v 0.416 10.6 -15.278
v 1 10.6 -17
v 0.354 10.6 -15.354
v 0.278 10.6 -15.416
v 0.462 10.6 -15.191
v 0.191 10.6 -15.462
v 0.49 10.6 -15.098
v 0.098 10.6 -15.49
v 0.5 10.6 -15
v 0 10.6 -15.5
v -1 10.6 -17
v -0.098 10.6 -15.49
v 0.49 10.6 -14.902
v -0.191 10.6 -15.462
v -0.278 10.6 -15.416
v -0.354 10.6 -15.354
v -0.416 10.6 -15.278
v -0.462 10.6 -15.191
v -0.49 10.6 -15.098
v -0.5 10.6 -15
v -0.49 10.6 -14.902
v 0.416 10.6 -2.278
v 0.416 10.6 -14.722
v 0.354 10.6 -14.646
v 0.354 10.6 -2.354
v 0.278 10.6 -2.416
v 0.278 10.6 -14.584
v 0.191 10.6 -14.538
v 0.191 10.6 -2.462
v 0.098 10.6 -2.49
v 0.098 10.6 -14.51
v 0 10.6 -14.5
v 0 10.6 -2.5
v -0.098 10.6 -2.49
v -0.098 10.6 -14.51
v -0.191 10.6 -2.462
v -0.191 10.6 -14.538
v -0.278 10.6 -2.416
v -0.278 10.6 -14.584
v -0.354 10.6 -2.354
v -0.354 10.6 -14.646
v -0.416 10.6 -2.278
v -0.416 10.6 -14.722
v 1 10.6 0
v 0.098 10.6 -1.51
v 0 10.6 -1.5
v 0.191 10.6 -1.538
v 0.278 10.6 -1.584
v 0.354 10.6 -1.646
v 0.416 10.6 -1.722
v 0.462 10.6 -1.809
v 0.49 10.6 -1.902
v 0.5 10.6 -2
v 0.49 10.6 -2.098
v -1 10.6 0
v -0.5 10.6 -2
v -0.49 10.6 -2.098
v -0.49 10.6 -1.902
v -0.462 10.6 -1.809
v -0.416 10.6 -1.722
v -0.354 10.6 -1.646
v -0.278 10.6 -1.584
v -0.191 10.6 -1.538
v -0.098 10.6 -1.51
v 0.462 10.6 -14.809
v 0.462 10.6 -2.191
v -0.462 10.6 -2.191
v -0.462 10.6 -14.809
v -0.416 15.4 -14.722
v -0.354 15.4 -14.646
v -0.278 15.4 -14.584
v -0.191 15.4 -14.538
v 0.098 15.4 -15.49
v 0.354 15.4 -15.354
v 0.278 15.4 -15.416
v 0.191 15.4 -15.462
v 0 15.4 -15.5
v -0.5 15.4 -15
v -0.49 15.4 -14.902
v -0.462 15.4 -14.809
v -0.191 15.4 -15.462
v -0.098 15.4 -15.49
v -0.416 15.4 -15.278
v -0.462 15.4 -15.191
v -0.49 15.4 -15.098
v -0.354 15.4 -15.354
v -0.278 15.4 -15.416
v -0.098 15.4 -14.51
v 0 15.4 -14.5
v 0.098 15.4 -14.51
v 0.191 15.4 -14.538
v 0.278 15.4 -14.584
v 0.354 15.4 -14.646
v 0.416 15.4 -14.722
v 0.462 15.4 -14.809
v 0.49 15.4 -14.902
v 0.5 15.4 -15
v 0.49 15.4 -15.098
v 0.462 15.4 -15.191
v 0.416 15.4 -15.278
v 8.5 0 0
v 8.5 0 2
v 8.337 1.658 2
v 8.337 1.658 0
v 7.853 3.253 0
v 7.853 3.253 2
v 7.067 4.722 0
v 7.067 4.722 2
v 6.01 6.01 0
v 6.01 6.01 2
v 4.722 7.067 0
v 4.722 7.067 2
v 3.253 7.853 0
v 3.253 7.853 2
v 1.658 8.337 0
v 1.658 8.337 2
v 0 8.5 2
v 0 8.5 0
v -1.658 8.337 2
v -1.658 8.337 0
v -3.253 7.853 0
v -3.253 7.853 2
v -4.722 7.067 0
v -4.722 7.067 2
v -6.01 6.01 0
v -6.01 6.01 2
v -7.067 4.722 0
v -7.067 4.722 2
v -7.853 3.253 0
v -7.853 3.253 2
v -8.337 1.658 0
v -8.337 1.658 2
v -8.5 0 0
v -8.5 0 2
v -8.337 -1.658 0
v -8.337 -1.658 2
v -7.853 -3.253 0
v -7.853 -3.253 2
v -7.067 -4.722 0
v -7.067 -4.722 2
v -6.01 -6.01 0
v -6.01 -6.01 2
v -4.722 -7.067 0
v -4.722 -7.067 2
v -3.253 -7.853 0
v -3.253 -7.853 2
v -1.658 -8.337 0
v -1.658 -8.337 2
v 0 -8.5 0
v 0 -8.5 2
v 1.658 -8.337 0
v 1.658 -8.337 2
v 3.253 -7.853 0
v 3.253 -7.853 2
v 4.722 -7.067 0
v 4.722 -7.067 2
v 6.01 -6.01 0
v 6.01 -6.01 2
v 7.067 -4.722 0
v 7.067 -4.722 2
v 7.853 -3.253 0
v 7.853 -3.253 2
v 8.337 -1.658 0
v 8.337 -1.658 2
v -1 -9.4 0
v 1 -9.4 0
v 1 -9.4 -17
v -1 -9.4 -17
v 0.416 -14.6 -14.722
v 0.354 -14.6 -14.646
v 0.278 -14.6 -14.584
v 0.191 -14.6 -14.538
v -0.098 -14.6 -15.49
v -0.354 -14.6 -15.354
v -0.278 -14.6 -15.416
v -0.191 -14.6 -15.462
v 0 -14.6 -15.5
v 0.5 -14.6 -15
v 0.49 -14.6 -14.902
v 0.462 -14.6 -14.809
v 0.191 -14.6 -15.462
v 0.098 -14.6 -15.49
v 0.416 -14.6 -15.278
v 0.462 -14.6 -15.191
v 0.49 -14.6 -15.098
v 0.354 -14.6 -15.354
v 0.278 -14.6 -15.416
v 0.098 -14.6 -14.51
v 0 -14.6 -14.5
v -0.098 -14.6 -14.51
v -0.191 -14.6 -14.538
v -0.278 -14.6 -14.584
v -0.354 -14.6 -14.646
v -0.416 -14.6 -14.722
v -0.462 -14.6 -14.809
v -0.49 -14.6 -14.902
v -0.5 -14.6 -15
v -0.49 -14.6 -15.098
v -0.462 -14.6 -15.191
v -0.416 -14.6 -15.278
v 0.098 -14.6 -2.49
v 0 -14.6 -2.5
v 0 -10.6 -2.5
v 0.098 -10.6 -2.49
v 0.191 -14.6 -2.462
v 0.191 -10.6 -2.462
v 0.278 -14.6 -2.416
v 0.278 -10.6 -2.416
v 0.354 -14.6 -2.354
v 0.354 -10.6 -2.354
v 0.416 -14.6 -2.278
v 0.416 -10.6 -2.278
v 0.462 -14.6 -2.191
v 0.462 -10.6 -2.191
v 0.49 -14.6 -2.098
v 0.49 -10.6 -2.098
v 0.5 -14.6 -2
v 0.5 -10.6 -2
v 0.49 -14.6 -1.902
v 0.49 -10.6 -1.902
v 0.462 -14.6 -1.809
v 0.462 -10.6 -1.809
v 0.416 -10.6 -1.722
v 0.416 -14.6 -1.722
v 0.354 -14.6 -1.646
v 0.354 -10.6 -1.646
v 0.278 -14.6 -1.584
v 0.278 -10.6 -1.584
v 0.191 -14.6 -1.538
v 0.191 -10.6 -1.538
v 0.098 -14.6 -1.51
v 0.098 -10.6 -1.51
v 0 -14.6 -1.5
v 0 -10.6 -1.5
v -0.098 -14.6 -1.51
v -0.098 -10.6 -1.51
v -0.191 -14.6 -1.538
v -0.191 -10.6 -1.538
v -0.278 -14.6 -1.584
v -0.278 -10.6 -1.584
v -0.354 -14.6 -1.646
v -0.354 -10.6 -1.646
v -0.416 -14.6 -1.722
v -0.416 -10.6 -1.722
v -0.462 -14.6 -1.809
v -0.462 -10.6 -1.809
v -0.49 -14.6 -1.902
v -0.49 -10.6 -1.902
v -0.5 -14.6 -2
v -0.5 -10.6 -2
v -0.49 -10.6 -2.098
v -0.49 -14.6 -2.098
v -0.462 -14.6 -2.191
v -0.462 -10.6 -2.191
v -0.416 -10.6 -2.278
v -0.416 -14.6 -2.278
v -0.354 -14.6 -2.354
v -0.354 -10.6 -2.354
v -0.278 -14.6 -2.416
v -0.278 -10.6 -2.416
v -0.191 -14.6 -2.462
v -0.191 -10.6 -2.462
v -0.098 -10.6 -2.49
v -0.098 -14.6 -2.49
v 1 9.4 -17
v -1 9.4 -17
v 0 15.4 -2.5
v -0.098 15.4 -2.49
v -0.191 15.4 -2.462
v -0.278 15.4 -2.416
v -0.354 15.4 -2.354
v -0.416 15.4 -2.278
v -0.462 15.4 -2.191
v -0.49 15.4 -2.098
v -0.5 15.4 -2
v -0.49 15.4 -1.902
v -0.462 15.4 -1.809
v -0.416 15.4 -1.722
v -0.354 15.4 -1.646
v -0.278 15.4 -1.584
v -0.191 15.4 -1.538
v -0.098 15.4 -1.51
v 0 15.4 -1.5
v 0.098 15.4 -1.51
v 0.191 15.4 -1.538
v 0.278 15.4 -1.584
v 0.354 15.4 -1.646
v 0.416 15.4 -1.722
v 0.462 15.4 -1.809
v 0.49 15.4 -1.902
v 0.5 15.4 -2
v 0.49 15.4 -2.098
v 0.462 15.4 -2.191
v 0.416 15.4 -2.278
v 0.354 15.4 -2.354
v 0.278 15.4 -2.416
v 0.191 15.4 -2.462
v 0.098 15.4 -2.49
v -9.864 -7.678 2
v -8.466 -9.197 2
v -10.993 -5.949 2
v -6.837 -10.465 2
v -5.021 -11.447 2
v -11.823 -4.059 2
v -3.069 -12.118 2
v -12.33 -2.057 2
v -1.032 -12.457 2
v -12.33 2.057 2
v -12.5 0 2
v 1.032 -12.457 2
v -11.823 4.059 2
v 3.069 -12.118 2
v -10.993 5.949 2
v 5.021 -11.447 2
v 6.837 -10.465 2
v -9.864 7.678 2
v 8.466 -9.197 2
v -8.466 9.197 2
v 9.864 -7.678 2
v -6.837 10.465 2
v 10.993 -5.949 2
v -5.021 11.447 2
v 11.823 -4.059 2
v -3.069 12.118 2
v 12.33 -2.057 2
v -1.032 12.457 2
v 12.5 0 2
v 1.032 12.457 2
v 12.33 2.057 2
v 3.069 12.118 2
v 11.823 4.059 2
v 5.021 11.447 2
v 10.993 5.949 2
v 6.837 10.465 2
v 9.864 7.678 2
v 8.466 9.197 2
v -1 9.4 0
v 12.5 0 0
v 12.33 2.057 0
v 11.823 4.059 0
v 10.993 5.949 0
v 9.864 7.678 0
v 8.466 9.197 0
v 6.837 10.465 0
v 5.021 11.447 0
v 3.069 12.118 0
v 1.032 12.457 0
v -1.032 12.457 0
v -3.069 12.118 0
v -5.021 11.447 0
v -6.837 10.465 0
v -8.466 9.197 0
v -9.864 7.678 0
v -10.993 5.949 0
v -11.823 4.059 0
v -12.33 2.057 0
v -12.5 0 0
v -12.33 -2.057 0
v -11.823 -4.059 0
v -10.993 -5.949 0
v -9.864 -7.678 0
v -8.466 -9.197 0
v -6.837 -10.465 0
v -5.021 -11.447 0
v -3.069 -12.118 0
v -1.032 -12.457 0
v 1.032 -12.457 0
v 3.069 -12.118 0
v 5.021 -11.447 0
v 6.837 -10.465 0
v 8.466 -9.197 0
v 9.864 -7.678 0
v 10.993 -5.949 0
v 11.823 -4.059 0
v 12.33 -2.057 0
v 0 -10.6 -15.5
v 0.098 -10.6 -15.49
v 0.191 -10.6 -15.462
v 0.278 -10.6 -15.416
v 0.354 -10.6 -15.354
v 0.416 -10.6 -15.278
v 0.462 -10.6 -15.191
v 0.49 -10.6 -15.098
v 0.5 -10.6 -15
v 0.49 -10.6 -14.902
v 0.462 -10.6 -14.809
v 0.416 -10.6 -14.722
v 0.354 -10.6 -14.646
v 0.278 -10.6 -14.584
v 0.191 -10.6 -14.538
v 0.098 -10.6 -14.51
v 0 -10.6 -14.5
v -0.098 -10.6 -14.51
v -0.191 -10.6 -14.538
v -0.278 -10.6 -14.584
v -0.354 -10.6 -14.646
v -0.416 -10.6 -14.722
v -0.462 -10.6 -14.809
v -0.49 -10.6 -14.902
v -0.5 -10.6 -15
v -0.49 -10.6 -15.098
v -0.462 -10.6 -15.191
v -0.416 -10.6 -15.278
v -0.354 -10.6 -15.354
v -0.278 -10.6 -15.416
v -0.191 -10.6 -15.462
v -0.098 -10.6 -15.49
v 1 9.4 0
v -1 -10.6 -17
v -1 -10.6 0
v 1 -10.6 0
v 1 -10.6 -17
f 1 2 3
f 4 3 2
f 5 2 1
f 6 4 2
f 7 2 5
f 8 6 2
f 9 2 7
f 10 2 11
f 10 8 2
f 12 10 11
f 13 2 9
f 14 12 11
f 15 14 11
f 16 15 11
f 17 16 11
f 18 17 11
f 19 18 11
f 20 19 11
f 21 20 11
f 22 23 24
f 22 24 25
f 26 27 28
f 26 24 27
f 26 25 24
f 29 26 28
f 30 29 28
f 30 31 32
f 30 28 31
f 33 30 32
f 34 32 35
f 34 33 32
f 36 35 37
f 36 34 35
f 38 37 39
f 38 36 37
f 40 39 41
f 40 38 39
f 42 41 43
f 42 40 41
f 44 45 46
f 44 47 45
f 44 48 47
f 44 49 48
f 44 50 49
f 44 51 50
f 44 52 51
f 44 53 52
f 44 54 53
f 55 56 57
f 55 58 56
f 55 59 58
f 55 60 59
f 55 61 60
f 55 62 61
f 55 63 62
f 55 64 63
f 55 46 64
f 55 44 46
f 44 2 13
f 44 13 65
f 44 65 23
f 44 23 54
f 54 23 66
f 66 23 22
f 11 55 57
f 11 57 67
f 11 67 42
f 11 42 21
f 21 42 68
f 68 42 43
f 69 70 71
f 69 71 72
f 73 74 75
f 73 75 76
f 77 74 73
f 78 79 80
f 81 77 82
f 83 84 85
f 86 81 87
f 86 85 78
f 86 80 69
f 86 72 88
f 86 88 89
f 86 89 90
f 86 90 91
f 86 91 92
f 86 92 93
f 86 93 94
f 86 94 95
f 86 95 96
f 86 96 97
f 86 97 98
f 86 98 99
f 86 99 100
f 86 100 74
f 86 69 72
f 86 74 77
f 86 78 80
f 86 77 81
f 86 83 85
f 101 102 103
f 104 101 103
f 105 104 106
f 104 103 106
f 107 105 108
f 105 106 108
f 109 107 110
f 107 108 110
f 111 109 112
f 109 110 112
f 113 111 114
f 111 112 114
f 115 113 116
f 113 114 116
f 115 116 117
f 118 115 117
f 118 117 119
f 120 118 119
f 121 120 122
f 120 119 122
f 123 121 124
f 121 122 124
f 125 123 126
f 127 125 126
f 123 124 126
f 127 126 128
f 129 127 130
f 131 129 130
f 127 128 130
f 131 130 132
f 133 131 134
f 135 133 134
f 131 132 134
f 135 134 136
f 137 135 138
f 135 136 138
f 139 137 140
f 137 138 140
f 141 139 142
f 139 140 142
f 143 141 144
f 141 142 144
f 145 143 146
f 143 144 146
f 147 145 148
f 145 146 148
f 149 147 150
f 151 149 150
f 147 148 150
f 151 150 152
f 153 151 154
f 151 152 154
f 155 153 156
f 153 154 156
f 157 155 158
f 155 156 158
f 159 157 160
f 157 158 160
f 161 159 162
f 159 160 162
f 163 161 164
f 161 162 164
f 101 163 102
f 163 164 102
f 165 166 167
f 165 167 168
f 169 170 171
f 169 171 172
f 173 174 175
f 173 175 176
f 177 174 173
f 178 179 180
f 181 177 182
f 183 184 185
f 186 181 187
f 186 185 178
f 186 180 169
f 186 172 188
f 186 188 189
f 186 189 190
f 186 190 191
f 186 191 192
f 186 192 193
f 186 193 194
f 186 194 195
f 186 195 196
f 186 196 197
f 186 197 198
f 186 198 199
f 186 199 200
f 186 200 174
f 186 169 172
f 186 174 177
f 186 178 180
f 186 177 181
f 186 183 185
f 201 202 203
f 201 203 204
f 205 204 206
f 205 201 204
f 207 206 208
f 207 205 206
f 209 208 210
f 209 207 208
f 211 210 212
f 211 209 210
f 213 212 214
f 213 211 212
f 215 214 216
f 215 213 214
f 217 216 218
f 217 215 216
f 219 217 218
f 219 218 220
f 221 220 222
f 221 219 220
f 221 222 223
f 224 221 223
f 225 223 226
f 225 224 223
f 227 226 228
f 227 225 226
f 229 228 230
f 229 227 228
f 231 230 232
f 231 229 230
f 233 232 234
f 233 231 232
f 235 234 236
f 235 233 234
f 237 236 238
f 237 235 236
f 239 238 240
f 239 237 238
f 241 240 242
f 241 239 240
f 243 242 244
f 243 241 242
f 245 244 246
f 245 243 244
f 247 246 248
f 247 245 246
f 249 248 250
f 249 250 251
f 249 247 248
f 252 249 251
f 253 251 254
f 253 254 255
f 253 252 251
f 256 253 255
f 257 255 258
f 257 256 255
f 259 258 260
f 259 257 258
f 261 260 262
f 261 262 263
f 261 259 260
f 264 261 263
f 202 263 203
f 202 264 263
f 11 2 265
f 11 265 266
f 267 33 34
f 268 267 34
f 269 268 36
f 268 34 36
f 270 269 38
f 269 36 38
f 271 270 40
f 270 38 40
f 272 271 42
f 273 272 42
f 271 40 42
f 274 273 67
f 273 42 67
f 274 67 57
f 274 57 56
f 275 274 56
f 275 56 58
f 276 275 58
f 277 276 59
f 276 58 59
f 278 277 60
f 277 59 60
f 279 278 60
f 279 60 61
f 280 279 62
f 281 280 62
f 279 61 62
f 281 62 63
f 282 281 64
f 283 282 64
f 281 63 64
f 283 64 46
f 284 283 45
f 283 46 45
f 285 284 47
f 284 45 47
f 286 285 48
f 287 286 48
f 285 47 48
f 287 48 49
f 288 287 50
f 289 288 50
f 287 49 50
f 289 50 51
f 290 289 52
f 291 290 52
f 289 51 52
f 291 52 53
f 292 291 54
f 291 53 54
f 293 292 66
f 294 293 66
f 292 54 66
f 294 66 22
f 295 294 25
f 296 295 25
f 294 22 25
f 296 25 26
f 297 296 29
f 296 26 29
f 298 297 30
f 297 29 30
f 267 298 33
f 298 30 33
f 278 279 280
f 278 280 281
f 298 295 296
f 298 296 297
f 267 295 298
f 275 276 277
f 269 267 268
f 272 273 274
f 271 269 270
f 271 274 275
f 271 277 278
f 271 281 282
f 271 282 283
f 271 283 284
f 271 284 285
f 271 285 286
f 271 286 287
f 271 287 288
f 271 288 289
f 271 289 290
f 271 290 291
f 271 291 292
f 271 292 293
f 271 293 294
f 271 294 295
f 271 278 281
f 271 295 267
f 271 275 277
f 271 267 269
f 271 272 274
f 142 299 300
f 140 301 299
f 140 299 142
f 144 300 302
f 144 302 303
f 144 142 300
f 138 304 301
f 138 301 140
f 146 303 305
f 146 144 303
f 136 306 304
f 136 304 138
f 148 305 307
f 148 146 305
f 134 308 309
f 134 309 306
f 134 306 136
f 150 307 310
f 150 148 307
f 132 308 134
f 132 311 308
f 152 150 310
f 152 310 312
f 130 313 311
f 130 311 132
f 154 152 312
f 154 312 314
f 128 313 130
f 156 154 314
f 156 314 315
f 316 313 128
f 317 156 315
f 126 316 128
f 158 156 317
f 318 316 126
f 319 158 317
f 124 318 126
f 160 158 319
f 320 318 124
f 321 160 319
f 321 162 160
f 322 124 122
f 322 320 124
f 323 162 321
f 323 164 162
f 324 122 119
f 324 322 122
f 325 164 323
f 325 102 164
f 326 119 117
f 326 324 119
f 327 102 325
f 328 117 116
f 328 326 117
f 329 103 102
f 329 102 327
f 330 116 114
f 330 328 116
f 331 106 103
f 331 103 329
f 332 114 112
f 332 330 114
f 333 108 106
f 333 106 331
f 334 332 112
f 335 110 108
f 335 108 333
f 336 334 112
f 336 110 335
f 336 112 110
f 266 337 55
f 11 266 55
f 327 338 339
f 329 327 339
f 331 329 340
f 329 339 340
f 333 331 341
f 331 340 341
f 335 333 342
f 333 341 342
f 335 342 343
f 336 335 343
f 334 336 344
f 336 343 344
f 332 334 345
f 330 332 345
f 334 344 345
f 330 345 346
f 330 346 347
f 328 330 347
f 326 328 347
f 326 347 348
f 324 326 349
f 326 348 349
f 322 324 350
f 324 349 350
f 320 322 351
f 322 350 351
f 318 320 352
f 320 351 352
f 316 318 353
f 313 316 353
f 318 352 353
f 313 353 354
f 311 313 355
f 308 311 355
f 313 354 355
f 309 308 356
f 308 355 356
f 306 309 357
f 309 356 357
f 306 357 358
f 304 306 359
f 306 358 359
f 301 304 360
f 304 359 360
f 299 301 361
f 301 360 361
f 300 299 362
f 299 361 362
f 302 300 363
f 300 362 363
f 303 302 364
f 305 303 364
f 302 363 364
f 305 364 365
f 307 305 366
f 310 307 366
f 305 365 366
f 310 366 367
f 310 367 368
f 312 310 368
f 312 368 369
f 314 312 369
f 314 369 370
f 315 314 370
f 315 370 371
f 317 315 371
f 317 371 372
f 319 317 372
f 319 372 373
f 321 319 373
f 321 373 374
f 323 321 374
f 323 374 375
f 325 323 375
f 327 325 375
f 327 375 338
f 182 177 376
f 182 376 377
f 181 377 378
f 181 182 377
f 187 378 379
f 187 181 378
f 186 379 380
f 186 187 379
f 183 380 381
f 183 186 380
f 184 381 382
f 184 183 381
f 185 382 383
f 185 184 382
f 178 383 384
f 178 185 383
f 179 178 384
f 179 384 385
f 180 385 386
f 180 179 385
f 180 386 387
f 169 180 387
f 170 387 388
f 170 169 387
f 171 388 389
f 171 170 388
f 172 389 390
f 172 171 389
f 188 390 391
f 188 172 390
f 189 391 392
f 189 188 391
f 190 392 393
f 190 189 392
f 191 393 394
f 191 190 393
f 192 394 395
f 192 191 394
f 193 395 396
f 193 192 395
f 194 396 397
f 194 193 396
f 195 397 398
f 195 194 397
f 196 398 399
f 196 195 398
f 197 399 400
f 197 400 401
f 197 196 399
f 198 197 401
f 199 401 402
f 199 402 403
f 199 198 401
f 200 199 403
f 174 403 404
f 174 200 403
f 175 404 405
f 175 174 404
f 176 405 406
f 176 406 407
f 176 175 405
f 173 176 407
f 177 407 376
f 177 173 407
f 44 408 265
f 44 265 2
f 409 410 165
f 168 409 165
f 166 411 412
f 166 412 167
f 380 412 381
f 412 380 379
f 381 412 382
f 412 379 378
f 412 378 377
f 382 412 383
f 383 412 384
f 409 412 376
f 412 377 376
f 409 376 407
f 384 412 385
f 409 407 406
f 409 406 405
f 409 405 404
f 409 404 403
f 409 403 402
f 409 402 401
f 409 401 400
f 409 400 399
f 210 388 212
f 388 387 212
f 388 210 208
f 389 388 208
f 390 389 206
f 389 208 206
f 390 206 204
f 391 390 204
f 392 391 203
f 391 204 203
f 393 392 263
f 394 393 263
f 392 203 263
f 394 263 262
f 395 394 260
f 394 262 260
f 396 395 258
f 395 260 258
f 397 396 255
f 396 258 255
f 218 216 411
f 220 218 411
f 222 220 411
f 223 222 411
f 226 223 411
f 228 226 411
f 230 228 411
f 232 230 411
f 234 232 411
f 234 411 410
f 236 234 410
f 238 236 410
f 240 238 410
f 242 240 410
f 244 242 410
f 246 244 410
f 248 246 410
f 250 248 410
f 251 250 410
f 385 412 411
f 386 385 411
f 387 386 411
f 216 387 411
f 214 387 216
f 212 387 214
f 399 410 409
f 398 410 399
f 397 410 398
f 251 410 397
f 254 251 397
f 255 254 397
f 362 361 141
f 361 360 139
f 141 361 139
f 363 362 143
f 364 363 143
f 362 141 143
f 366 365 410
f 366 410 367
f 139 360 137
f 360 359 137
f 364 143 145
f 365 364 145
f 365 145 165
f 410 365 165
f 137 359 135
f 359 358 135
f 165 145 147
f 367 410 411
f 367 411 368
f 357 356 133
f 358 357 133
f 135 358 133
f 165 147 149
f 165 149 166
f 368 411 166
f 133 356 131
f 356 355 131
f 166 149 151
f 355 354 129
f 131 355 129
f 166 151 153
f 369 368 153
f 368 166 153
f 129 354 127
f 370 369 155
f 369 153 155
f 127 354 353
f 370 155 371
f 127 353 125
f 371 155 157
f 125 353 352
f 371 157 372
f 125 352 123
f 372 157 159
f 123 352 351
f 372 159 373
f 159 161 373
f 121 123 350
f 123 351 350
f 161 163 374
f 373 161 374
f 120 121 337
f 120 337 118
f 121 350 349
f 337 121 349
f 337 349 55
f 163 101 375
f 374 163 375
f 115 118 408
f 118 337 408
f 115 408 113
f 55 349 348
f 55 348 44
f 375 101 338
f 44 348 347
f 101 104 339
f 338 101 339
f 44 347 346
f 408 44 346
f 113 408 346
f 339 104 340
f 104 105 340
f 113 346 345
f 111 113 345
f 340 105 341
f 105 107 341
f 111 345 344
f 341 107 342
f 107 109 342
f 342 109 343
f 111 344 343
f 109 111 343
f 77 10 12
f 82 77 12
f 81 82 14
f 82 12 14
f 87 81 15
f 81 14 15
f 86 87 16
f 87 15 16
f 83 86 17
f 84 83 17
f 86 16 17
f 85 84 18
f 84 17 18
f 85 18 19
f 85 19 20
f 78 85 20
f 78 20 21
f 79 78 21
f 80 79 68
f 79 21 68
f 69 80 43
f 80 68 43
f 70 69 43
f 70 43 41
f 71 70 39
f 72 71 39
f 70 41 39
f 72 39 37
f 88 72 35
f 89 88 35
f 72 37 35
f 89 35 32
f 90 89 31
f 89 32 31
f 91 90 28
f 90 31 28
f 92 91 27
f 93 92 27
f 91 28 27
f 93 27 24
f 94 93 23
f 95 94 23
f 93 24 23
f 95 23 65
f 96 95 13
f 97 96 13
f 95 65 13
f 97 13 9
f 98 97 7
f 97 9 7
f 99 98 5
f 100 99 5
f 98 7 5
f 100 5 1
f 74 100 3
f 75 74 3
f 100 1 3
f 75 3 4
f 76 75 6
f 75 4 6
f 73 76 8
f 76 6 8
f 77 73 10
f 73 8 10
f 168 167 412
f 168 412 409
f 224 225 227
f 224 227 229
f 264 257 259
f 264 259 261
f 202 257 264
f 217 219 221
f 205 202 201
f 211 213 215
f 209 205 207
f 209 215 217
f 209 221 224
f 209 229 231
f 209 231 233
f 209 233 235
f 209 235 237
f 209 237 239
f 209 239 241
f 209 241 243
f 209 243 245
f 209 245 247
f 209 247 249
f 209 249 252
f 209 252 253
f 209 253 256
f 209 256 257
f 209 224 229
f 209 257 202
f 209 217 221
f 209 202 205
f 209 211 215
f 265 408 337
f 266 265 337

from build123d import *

# Parameters (mm, degrees)
SKETCH1_R           = 12.5
BOSS_EXTRUDE1_DEPTH = 2
SKETCH2_R           = 8.5
CUT_EXTRUDE1_DEPTH  = 2
SKETCH5_W           = 2
SKETCH5_H           = 1.2
BOSS_EXTRUDE3_DEPTH = 17
SKETCH8_R           = 0.5
BOSS_EXTRUDE4_DEPTH = 4.8
BOSS_EXTRUDE5_START = 4
SKETCH9_R           = 0.5
BOSS_EXTRUDE5_DEPTH = 4


with BuildPart() as part:
    # Sketch1 → Boss-Extrude1 (new body)
    with BuildSketch(Plane.XY):
        Circle(SKETCH1_R)
    extrude(amount=BOSS_EXTRUDE1_DEPTH)

    # Sketch2 → Cut-Extrude1 (cut)
    with BuildSketch(Plane.XY.offset(2)):
        Circle(SKETCH2_R)
    extrude(amount=-CUT_EXTRUDE1_DEPTH, mode=Mode.SUBTRACT)

    # Sketch5 → Boss-Extrude3 (add)
    with BuildSketch(Plane(origin=(0, 0, 0), x_dir=(-1, 0, 0), z_dir=(0, 0, -1))):
        with Locations((0, -10)):
            Rectangle(SKETCH5_W, SKETCH5_H)
        with Locations((0, 10)):
            Rectangle(SKETCH5_W, SKETCH5_H)
    extrude(amount=BOSS_EXTRUDE3_DEPTH)

    # Sketch8 → Boss-Extrude4 (add)
    with BuildSketch(Plane(origin=(0, 10.6, 0), x_dir=(1, 0, 0), z_dir=(0, 1, 0))):
        with Locations(Location((0, 2, 0), (0, 0, 90))):
            Circle(SKETCH8_R)
        with Locations(Location((0, 15, 0), (0, 0, 90))):
            Circle(SKETCH8_R)
    extrude(amount=BOSS_EXTRUDE4_DEPTH)

    # Sketch9 → Boss-Extrude5 (add)
    with BuildSketch(Plane.XZ.offset(10.6).offset(BOSS_EXTRUDE5_START)):
        with Locations(Location((0, -2, 0), (0, 0, 270))):
            Circle(SKETCH9_R)
        with Locations(Location((0, -15, 0), (0, 0, 270))):
            Circle(SKETCH9_R)
    extrude(amount=-BOSS_EXTRUDE5_DEPTH)


solid = part.part
